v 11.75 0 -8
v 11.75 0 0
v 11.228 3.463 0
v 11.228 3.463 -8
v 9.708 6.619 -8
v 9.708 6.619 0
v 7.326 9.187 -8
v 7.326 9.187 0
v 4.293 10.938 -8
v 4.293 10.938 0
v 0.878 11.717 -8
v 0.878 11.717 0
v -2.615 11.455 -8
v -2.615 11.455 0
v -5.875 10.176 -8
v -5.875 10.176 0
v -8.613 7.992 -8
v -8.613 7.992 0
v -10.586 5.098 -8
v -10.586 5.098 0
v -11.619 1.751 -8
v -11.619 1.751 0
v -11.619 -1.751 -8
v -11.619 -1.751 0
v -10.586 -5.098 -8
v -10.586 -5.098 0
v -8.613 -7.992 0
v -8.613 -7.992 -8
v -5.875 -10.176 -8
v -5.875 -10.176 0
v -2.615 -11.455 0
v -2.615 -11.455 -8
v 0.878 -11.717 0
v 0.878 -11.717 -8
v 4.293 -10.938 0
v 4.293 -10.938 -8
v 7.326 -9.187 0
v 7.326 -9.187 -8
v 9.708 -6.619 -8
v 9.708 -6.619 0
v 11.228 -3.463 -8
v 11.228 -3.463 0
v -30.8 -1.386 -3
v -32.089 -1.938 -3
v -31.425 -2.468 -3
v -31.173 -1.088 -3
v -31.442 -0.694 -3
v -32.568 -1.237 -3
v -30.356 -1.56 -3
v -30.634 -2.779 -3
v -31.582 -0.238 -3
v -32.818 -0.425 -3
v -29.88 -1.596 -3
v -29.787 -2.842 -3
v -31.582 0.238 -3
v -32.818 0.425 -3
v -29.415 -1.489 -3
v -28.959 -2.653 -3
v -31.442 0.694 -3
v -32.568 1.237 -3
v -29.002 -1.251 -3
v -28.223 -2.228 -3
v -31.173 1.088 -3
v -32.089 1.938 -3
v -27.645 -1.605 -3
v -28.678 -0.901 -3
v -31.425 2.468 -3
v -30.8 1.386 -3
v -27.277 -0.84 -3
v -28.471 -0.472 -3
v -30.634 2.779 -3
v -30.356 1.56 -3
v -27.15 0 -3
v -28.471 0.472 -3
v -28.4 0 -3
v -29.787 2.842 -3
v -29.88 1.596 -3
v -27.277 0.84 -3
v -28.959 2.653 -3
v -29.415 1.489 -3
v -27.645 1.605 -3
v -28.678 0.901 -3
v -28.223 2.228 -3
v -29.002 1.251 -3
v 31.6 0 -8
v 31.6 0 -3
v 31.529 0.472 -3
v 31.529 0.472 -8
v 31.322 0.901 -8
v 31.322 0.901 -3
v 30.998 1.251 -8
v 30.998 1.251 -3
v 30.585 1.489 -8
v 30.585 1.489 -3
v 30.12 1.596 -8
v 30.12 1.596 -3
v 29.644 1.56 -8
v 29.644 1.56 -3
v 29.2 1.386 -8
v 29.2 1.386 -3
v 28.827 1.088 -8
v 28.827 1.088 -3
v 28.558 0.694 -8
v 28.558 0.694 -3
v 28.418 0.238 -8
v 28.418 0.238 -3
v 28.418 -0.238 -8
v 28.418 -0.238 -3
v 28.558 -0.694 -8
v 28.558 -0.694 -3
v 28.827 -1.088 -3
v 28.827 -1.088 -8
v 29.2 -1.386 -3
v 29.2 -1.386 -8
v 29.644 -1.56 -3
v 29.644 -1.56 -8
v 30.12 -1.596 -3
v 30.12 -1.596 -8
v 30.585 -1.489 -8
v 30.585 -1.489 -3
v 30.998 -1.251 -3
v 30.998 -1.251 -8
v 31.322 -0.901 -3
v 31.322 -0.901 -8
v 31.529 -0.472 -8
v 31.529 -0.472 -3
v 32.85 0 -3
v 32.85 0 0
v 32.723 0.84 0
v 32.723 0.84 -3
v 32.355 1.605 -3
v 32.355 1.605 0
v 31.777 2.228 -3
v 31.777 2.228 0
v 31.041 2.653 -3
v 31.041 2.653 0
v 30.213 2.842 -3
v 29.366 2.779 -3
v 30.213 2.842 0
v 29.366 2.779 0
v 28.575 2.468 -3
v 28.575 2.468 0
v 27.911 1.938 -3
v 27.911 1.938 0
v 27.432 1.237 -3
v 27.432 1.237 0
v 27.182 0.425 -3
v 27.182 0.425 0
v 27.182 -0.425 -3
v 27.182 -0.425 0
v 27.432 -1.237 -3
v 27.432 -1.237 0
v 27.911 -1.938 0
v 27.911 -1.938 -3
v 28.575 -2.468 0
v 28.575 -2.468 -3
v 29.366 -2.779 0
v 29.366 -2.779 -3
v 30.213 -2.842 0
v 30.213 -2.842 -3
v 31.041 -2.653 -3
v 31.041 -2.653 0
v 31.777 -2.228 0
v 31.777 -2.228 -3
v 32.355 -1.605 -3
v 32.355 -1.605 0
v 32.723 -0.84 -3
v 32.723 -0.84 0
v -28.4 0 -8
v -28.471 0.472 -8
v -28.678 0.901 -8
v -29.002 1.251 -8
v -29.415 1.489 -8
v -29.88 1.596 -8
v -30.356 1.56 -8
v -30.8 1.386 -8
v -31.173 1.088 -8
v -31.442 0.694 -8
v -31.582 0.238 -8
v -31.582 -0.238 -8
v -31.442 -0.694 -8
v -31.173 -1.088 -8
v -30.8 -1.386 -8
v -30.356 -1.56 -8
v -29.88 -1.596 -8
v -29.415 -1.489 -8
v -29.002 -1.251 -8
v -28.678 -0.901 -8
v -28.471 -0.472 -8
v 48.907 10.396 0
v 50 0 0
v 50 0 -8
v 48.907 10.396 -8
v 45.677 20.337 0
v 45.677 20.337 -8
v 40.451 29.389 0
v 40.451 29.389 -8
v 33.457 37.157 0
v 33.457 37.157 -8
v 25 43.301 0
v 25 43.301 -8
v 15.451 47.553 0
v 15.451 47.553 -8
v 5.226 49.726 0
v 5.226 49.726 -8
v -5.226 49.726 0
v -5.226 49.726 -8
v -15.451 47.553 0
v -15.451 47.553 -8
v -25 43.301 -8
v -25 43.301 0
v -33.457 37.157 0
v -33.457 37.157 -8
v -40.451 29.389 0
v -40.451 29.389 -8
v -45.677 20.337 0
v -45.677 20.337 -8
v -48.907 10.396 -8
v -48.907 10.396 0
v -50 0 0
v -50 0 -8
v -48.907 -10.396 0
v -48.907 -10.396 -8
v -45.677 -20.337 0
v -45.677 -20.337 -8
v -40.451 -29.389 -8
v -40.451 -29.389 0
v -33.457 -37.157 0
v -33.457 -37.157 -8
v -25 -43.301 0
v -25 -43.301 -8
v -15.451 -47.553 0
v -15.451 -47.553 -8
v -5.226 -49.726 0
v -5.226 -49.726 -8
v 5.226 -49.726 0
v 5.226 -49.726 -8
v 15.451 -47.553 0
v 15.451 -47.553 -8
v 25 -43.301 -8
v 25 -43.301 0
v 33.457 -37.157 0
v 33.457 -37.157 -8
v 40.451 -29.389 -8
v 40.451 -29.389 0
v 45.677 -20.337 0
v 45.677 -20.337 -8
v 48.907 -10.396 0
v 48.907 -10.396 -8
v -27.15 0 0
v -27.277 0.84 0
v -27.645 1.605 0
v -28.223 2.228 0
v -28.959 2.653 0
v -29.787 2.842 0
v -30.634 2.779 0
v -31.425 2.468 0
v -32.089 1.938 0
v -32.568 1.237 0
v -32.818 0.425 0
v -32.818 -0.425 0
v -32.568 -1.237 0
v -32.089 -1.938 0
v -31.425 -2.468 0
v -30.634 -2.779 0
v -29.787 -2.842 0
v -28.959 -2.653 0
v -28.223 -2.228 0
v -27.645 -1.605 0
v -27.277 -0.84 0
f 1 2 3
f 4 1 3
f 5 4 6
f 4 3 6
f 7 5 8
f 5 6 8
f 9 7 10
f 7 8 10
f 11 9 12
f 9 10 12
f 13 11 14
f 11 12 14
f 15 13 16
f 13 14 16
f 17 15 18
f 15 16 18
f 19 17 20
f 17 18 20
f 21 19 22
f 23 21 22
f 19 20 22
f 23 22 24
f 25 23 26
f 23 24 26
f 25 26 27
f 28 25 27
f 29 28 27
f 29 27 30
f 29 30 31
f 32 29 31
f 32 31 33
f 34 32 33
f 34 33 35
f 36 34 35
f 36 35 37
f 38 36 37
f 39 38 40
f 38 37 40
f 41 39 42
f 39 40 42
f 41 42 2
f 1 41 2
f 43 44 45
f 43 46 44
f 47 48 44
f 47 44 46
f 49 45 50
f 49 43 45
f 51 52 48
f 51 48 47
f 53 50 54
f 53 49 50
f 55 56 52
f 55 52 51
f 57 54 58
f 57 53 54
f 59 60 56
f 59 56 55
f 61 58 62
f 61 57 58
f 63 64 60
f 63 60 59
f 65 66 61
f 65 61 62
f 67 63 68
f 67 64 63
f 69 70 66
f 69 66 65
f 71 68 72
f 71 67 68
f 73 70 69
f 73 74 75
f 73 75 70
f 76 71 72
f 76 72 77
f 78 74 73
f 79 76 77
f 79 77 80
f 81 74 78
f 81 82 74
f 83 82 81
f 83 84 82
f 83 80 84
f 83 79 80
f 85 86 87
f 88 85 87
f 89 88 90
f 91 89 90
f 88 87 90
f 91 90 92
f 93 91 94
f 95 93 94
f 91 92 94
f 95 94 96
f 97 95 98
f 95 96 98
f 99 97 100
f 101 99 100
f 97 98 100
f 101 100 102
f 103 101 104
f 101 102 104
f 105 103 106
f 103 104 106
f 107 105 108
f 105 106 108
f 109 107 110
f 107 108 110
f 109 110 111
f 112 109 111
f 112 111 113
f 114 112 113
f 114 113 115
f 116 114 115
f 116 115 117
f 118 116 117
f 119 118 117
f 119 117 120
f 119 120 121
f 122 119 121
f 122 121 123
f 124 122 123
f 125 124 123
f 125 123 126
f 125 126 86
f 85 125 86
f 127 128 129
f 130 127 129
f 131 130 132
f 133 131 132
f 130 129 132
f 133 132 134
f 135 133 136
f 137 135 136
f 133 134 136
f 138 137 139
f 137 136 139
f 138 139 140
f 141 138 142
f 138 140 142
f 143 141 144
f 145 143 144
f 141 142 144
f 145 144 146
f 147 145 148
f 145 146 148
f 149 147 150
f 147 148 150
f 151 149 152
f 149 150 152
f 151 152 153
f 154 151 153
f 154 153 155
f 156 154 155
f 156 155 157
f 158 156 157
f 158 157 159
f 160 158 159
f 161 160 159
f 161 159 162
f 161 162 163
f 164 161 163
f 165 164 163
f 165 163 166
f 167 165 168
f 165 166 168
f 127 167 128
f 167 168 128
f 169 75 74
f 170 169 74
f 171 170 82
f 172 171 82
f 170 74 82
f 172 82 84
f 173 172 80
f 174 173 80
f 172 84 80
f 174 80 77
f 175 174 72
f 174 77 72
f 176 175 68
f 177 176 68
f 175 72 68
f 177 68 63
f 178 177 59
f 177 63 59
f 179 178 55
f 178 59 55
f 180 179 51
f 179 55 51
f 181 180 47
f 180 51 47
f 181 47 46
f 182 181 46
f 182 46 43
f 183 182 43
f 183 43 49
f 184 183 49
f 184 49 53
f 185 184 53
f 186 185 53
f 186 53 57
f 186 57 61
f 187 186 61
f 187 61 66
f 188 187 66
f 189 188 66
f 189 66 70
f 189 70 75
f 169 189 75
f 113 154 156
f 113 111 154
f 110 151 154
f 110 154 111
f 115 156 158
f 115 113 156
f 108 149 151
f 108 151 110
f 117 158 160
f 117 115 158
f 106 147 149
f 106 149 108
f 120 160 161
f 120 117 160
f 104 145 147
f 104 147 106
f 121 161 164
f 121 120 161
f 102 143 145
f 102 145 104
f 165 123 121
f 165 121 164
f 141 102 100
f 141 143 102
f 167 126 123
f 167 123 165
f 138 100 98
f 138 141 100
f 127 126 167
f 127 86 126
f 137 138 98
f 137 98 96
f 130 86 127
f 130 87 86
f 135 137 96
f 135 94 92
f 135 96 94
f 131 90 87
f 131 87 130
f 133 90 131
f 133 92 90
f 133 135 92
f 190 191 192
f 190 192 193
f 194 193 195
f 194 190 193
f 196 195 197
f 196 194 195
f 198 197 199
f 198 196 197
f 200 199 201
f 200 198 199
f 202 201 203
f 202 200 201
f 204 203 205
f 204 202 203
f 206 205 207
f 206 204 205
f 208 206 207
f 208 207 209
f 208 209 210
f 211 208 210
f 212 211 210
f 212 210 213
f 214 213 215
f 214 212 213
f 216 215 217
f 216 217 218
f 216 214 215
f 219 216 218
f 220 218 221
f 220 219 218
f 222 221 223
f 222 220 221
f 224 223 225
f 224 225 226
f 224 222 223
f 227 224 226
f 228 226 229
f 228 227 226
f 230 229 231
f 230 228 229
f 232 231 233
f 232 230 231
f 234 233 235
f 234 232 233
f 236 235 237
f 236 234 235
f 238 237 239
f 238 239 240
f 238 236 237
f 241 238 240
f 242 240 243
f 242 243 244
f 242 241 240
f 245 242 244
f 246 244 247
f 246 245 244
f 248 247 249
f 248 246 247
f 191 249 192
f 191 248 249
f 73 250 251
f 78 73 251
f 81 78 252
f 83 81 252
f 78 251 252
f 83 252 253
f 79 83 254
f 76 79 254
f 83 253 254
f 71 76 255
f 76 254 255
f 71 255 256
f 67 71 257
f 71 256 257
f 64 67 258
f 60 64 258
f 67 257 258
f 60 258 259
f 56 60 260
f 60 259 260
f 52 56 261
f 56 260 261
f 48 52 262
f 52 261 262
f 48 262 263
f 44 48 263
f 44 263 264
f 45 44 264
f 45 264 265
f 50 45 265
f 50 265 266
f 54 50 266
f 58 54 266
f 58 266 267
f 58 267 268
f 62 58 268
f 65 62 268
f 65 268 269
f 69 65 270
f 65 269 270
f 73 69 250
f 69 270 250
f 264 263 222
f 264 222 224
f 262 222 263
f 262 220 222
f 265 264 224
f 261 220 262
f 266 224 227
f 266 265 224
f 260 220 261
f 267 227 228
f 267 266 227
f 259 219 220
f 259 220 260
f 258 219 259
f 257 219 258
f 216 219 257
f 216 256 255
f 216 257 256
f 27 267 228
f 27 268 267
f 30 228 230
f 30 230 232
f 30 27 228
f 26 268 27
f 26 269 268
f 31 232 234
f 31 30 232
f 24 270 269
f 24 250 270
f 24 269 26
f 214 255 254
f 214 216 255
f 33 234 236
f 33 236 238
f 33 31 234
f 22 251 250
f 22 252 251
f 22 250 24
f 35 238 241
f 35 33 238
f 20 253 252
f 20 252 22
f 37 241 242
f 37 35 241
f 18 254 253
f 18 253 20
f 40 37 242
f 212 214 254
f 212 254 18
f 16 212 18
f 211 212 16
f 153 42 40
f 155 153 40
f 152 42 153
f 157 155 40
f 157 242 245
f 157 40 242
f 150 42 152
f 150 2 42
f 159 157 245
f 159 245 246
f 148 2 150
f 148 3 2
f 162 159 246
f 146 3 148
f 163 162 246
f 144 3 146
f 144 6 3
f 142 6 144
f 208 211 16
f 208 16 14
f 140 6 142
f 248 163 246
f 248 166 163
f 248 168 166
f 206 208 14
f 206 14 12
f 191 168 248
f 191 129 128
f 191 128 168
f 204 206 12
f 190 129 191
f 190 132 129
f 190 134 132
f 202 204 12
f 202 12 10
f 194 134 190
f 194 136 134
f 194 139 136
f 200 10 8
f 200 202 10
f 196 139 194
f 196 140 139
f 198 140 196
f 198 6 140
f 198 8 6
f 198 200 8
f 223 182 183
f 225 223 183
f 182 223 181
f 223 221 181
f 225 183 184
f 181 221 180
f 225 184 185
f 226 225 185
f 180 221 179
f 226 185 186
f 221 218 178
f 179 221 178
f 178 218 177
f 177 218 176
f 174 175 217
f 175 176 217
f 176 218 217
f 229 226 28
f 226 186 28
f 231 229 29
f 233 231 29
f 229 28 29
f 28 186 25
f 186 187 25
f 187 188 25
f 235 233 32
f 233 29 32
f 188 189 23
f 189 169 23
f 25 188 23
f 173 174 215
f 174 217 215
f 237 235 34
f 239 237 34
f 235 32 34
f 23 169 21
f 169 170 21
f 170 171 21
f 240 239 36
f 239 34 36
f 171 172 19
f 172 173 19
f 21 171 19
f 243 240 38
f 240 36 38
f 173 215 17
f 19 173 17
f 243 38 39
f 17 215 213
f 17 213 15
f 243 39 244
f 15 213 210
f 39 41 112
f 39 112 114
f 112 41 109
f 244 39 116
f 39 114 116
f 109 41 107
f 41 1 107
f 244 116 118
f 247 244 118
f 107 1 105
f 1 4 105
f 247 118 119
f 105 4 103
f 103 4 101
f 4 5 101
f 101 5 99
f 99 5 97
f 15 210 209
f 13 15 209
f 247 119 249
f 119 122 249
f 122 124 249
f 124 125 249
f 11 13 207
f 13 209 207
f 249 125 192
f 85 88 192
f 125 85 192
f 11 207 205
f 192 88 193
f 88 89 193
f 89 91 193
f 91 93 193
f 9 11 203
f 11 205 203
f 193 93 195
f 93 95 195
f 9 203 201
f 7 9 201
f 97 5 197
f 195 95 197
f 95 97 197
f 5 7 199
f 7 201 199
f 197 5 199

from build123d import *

# Parameters (mm, degrees)
ESQUISSE1_R             = 50
ESQUISSE1_R_2           = 11.75
BOSS_EXTRU_1_DEPTH      = 8
ESQUISSE2_R             = 1.6
ENL_V_MAT_EXTRU_1_DEPTH = 72.161787499
ESQUISSE3_R             = 2.85
ENL_V_MAT_EXTRU_2_DEPTH = 3


with BuildPart() as part:
    # Esquisse1 → Boss.-Extru.1 (new body)
    with BuildSketch(Plane.XY):
        Circle(ESQUISSE1_R)
        Circle(ESQUISSE1_R_2, mode=Mode.SUBTRACT)
    extrude(amount=-BOSS_EXTRU_1_DEPTH)

    # Esquisse2 → Enlèv. mat.-Extru.1 (cut, through all)
    with BuildSketch(Plane.XY):
        with Locations((30, 0)):
            Circle(ESQUISSE2_R)
        with Locations((-30, 0)):
            Circle(ESQUISSE2_R)
    extrude(amount=-ENL_V_MAT_EXTRU_1_DEPTH, mode=Mode.SUBTRACT)

    # Esquisse3 → Enlèv. mat.-Extru.2 (cut)
    with BuildSketch(Plane.XY):
        with Locations((30, 0)):
            Circle(ESQUISSE3_R)
        with Locations((-30, 0)):
            Circle(ESQUISSE3_R)
    extrude(amount=-ENL_V_MAT_EXTRU_2_DEPTH, mode=Mode.SUBTRACT)


solid = part.part
